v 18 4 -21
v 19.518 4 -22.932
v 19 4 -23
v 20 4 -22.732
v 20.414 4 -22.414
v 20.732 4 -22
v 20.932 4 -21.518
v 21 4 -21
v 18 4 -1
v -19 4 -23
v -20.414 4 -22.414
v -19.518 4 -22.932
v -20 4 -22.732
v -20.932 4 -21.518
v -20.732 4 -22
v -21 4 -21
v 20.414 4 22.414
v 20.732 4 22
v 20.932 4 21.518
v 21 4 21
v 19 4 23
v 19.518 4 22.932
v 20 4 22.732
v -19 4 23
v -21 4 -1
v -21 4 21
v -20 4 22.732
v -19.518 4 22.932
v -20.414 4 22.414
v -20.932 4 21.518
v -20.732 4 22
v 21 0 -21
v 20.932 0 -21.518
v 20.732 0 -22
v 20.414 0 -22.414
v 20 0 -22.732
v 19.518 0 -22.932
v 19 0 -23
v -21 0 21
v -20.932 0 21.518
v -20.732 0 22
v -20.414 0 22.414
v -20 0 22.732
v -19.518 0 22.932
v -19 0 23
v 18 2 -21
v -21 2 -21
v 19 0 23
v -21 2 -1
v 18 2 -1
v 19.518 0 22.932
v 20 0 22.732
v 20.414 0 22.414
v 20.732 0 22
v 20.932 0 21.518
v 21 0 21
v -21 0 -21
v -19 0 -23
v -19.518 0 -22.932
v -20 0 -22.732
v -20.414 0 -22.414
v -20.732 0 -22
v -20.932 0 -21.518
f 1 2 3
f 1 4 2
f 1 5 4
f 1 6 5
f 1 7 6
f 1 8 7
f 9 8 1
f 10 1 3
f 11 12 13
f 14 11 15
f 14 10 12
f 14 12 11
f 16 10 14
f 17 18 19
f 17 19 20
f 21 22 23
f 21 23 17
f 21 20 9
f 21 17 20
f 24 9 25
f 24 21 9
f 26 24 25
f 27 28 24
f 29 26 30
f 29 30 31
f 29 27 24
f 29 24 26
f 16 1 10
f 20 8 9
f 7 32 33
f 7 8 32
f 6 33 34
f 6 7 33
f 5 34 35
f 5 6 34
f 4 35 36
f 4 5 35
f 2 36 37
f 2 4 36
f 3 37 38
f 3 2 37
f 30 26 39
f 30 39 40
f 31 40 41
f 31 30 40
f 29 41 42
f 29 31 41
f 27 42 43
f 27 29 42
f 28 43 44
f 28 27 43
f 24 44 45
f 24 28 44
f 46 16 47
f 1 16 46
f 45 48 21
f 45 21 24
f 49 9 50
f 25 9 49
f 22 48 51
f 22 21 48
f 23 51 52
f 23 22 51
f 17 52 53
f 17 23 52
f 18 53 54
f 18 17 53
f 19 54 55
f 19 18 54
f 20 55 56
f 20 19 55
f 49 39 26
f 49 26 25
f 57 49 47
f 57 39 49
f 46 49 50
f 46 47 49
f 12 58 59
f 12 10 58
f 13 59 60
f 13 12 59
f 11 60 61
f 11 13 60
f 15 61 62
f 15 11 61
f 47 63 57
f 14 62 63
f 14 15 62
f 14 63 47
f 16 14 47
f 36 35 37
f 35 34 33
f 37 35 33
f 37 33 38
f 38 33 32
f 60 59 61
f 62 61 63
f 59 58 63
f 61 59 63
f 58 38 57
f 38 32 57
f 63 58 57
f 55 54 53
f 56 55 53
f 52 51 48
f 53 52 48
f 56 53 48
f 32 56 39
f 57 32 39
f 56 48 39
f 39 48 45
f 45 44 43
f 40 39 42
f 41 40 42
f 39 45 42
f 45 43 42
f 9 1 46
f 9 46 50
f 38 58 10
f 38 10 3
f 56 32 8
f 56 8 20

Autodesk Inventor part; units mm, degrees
ref_plane "YZ Plane" through (0, 0, 0) normal (1, 0, 0) x (0, 1, 0)
ref_plane "XZ Plane" through (0, 0, 0) normal (0, 1, 0) x (-1, 0, 0)
ref_plane "XY Plane" through (0, 0, 0) normal (0, 0, 1) x (1, 0, 0)
sketch "Sketch1" plane through (0, 0, 0) normal (0, 1, 0) x (-1, 0, 0)
  line L0 (-21, 23) -> (21, 23)
  line L1 (21, 23) -> (21, -23)
  line L2 (21, -23) -> (-21, -23)
  line L3 (-21, -23) -> (-21, 23)
  line L4 (-21, 23) -> (21, -23) construction
  line L5 (21, 23) -> (-21, -23) construction
  point P0 (0, 0)
  dimension "d0" = 42
  dimension "d1" = 46
extrude "wall3" add sketch "Sketch1" along normal blind 4
fillet "Fillet6" radius 2 1 edges at (-21, 2, -23)
fillet "Fillet7" radius 2 1 edges at (21, 2, -23)
fillet "Fillet8" radius 2 1 edges at (-21, 2, 23)
fillet "Fillet9" radius 2 1 edges at (21, 2, 23)
sketch "Sketch10" plane through (0, 4, 0) normal (0, 1, 0) x (1, 0, 0)
  line L0 (-20.8799, 11) -> (21, 11) construction
  line L1 (21, -21) -> (21, 21) projected
  line L2 (14.0018, 23) -> (14.0018, -23) construction
  line L3 (-19, -23) -> (19, -23) projected
  line L4 (19, 23) -> (-19, 23) projected
  line L5 (-21, 21) -> (18, 21)
  line L6 (18, 21) -> (18, 1)
  line L7 (18, 1) -> (-21, 1)
  line L8 (-21, 1) -> (-21, 21)
  line L9 (-21, 21) -> (18, 1) construction
  line L10 (18, 21) -> (-21, 1) construction
  line L11 (-21, 21) -> (-21, -21) projected
  point P0 (0, 0)
  point P1 (-1.5, 11)
  dimension "d98" = 34
  dimension "d99" = 20
  dimension "d100" = 3
extrude "Extrusion8" cut sketch "Sketch10" against normal blind 2
equation "\"d0\" = wallw"
equation "\"d72\" = wall3_thick"
equation "\"d89\" = cornerrad"
equation "\"d90\" = cornerrad"
equation "\"d91\" = cornerrad"
equation "\"d92\" = cornerrad"
equation "\"d98\" = distancefrombottom"
equation "\"d99\" = wall3sloth"
equation "\"d100\" = -0.5 * wall3slotw + 0.5 * wallw"
equation "\"d101\" = wall3slotd"
equation "\"printer3dtolerance\" = 0.12"
equation "\"wallw\" = 42"
equation "\"wallh\" = 44"
equation "\"cornerrad\" = 2"
equation "\"baseextra\" = 2"
equation "\"wall1_thick\" = 8"
equation "\"wall2_thick\" = 6.4"
equation "\"wall3_thick\" = 4"
equation "\"wall1slot\" = 8.12"
equation "\"wall2slot\" = 6.52"
equation "\"wall3slot\" = 4.12"
equation "\"gap2\" = 28"
equation "\"baseh\" = 79.12"
equation "\"basew\" = 44"
equation "\"base_thick\" = 6"
equation "\"base_slots_depth\" = 4"
equation "\"servomounth\" = 4"
equation "\"servosmallcircledia\" = 5.92"
equation "\"servomountsquare\" = 6"
equation "\"servobigcircledia\" = 11.62"
equation "\"servo9gw\" = 22.8"
equation "\"distancefromleft\" = 26"
equation "\"servopolygonl\" = 5.92"
equation "\"servopolygonr\" = 6.12"
equation "\"distancefrombottom\" = 34"
equation "\"d49\" = distancefrombottom"
equation "\"adapterh\" = 16"
equation "\"adapterw\" = 32"
equation "\"wall3sloth\" = 20"
equation "\"wall3slotw\" = 36"
equation "\"wall3slotd\" = 2"
properties part number "wall-end" material "Wood (Oak)"
